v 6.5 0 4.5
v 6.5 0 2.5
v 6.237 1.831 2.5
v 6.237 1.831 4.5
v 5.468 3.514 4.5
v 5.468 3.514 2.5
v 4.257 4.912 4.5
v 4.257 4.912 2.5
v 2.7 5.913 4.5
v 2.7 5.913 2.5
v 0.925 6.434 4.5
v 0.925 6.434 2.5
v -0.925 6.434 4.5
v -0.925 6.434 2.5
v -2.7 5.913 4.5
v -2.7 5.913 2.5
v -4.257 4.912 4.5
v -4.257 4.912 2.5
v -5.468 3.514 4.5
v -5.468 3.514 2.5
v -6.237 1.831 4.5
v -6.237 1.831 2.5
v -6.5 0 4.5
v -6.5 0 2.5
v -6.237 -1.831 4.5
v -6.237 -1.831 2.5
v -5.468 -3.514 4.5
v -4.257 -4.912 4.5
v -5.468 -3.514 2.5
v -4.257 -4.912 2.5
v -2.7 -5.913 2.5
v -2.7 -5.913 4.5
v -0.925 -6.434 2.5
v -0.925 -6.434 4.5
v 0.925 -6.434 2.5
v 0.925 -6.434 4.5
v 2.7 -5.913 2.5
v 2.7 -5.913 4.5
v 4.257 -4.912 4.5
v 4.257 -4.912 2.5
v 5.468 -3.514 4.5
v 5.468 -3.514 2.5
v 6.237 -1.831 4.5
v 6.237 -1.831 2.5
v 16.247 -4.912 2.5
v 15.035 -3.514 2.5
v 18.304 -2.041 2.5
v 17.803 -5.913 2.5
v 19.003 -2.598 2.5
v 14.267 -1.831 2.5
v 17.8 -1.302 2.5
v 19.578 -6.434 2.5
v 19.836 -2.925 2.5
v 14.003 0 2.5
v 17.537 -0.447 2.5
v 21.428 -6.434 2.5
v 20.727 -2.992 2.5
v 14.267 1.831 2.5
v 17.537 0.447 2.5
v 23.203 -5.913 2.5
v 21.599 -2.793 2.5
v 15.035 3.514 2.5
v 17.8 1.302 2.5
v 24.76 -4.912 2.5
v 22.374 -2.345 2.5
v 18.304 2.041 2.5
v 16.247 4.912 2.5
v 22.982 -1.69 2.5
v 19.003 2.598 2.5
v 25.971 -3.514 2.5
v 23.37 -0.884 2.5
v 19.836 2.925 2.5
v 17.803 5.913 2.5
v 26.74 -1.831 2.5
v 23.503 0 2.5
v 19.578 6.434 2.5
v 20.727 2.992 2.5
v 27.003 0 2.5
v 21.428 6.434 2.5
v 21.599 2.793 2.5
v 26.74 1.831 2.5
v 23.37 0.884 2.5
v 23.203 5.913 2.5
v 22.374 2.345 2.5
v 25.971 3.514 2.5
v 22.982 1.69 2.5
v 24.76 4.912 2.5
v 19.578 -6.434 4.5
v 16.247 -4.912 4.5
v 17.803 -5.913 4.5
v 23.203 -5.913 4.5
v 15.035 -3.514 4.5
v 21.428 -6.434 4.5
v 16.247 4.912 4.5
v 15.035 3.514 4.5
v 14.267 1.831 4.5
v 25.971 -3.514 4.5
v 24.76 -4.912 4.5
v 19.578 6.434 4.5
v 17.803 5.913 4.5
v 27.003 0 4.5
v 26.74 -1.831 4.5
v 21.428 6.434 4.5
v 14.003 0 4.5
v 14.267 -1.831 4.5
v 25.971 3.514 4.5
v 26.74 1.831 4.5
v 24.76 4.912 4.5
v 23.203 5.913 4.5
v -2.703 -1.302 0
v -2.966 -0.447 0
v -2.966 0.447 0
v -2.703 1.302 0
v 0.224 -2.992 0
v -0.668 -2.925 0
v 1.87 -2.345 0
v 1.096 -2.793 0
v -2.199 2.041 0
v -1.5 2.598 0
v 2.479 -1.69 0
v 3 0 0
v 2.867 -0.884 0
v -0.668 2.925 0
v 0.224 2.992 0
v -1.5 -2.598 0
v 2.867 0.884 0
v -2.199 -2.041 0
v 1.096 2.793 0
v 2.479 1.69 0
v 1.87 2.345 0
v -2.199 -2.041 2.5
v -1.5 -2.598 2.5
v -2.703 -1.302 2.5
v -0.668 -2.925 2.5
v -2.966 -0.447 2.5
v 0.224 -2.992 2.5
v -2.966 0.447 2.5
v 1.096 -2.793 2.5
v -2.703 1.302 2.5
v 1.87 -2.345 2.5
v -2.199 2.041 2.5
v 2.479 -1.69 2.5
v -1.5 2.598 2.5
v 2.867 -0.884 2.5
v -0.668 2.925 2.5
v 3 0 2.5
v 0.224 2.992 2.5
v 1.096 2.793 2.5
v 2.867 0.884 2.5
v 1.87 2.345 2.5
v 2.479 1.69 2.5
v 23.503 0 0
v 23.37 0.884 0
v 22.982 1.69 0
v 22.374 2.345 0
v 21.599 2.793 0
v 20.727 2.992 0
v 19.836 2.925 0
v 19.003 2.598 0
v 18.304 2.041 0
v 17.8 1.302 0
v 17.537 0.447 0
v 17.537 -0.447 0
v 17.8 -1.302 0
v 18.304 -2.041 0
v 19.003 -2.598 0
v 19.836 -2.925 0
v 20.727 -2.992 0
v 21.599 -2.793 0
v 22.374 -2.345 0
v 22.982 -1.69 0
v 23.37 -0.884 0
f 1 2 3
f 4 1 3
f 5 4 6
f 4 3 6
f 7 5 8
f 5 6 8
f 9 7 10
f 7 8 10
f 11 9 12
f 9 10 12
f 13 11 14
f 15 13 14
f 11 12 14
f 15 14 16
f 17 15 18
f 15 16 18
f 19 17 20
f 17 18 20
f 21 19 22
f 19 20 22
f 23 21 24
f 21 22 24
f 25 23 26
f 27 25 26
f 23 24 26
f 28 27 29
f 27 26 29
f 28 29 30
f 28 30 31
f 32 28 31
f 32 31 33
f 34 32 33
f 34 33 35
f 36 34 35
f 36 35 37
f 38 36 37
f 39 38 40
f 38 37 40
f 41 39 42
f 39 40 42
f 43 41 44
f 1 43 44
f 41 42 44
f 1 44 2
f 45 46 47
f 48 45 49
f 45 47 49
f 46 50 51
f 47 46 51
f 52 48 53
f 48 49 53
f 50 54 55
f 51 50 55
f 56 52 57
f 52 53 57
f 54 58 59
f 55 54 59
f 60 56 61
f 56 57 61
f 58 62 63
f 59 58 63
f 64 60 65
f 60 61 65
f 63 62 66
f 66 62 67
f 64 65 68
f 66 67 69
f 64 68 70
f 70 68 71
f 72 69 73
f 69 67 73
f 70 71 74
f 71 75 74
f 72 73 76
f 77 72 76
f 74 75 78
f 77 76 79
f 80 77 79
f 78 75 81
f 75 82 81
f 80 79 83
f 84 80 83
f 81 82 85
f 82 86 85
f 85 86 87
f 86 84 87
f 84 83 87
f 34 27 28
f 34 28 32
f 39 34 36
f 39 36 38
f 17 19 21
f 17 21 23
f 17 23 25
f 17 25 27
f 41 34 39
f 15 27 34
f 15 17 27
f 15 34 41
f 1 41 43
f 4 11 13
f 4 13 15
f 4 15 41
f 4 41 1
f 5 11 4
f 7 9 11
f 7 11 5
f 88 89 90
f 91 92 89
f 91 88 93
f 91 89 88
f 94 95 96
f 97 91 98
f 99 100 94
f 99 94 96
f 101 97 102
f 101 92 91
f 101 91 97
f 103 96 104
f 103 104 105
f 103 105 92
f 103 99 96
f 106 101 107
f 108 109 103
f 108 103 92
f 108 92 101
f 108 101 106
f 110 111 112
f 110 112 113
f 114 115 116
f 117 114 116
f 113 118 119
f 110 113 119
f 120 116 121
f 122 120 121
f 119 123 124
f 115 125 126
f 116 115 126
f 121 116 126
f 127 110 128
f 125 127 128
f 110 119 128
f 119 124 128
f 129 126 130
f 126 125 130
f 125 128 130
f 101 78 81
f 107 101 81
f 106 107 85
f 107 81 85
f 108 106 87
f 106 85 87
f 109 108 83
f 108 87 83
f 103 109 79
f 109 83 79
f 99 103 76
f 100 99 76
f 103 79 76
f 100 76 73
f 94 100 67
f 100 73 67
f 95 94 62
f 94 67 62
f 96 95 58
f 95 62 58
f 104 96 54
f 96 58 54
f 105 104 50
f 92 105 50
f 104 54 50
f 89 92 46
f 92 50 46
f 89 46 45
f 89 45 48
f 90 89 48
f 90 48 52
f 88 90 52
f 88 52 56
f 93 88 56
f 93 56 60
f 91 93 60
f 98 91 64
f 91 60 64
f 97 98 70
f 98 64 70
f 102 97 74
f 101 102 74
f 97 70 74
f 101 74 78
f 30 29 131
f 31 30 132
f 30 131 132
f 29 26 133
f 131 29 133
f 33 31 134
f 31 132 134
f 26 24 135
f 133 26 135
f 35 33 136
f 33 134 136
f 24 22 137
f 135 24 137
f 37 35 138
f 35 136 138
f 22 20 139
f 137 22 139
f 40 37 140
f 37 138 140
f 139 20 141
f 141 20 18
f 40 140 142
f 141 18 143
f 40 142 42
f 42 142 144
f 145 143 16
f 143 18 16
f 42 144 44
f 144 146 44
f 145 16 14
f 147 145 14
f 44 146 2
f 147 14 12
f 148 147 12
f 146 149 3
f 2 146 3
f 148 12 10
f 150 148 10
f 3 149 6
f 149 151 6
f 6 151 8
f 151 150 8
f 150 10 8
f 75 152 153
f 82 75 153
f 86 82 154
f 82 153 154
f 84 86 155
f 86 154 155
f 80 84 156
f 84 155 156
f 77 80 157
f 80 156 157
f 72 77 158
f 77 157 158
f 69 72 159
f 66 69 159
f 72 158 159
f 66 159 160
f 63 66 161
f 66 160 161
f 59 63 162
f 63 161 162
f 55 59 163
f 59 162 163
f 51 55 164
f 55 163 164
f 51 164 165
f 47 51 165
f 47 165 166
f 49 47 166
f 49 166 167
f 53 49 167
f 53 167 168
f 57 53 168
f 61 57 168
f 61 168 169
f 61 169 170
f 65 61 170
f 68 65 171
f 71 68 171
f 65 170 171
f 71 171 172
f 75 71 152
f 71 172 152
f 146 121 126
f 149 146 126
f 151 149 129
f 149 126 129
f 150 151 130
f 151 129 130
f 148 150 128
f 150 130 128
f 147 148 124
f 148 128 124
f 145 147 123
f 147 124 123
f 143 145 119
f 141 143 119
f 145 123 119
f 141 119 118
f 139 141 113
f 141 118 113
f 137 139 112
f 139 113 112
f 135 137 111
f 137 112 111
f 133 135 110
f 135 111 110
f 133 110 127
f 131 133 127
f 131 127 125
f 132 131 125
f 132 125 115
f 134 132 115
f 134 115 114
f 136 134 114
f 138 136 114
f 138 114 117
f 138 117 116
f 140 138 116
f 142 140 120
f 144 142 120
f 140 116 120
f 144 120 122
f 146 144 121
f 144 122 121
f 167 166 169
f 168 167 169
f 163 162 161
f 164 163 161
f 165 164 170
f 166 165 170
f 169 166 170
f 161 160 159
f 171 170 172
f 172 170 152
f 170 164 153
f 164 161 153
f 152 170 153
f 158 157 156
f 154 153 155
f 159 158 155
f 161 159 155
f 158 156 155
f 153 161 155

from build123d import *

# Parameters (mm, degrees)
F0_R      = 3
F1_DEPTH  = 2.5
F2_R      = 6.5
F2_R_2    = 3
F1_FACE_R = 3
F3_DEPTH  = 2
F4_R      = 3
F5_DEPTH  = 2.5
F6_R      = 6.5
F6_R_2    = 3
F7_DEPTH  = 2


with BuildPart() as f1:
    # F0 (on Top) → F1 (new body)
    with BuildSketch(Plane.XY):
        Circle(F0_R)
    extrude(amount=F1_DEPTH)

    # F2 (on face) + F1_face (on face) → F3 (join)
    with BuildSketch(Plane.XY.offset(2.5)):
        Circle(F2_R)
        Circle(F2_R_2, mode=Mode.SUBTRACT)
        Circle(F2_R_2)
    with BuildSketch(Plane.XY.offset(2.5)):
        Circle(F1_FACE_R)
    extrude(amount=F3_DEPTH)


with BuildPart() as f5:
    # F4 (on Top) → F5 (new body)
    with BuildSketch(Plane.XY):
        with Locations((20.503248, 0)):
            Circle(F4_R)
    extrude(amount=F5_DEPTH)

    # F6 (on face) → F7 (join)
    with BuildSketch(Plane.XY.offset(2.5)):
        with Locations((20.503248, 0)):
            Circle(F6_R)
        with Locations((20.503248, 0)):
            Circle(F6_R_2, mode=Mode.SUBTRACT)
        with Locations((20.503248, 0)):
            Circle(F6_R_2)
    extrude(amount=F7_DEPTH)


solid = Compound([f1.part, f5.part])
